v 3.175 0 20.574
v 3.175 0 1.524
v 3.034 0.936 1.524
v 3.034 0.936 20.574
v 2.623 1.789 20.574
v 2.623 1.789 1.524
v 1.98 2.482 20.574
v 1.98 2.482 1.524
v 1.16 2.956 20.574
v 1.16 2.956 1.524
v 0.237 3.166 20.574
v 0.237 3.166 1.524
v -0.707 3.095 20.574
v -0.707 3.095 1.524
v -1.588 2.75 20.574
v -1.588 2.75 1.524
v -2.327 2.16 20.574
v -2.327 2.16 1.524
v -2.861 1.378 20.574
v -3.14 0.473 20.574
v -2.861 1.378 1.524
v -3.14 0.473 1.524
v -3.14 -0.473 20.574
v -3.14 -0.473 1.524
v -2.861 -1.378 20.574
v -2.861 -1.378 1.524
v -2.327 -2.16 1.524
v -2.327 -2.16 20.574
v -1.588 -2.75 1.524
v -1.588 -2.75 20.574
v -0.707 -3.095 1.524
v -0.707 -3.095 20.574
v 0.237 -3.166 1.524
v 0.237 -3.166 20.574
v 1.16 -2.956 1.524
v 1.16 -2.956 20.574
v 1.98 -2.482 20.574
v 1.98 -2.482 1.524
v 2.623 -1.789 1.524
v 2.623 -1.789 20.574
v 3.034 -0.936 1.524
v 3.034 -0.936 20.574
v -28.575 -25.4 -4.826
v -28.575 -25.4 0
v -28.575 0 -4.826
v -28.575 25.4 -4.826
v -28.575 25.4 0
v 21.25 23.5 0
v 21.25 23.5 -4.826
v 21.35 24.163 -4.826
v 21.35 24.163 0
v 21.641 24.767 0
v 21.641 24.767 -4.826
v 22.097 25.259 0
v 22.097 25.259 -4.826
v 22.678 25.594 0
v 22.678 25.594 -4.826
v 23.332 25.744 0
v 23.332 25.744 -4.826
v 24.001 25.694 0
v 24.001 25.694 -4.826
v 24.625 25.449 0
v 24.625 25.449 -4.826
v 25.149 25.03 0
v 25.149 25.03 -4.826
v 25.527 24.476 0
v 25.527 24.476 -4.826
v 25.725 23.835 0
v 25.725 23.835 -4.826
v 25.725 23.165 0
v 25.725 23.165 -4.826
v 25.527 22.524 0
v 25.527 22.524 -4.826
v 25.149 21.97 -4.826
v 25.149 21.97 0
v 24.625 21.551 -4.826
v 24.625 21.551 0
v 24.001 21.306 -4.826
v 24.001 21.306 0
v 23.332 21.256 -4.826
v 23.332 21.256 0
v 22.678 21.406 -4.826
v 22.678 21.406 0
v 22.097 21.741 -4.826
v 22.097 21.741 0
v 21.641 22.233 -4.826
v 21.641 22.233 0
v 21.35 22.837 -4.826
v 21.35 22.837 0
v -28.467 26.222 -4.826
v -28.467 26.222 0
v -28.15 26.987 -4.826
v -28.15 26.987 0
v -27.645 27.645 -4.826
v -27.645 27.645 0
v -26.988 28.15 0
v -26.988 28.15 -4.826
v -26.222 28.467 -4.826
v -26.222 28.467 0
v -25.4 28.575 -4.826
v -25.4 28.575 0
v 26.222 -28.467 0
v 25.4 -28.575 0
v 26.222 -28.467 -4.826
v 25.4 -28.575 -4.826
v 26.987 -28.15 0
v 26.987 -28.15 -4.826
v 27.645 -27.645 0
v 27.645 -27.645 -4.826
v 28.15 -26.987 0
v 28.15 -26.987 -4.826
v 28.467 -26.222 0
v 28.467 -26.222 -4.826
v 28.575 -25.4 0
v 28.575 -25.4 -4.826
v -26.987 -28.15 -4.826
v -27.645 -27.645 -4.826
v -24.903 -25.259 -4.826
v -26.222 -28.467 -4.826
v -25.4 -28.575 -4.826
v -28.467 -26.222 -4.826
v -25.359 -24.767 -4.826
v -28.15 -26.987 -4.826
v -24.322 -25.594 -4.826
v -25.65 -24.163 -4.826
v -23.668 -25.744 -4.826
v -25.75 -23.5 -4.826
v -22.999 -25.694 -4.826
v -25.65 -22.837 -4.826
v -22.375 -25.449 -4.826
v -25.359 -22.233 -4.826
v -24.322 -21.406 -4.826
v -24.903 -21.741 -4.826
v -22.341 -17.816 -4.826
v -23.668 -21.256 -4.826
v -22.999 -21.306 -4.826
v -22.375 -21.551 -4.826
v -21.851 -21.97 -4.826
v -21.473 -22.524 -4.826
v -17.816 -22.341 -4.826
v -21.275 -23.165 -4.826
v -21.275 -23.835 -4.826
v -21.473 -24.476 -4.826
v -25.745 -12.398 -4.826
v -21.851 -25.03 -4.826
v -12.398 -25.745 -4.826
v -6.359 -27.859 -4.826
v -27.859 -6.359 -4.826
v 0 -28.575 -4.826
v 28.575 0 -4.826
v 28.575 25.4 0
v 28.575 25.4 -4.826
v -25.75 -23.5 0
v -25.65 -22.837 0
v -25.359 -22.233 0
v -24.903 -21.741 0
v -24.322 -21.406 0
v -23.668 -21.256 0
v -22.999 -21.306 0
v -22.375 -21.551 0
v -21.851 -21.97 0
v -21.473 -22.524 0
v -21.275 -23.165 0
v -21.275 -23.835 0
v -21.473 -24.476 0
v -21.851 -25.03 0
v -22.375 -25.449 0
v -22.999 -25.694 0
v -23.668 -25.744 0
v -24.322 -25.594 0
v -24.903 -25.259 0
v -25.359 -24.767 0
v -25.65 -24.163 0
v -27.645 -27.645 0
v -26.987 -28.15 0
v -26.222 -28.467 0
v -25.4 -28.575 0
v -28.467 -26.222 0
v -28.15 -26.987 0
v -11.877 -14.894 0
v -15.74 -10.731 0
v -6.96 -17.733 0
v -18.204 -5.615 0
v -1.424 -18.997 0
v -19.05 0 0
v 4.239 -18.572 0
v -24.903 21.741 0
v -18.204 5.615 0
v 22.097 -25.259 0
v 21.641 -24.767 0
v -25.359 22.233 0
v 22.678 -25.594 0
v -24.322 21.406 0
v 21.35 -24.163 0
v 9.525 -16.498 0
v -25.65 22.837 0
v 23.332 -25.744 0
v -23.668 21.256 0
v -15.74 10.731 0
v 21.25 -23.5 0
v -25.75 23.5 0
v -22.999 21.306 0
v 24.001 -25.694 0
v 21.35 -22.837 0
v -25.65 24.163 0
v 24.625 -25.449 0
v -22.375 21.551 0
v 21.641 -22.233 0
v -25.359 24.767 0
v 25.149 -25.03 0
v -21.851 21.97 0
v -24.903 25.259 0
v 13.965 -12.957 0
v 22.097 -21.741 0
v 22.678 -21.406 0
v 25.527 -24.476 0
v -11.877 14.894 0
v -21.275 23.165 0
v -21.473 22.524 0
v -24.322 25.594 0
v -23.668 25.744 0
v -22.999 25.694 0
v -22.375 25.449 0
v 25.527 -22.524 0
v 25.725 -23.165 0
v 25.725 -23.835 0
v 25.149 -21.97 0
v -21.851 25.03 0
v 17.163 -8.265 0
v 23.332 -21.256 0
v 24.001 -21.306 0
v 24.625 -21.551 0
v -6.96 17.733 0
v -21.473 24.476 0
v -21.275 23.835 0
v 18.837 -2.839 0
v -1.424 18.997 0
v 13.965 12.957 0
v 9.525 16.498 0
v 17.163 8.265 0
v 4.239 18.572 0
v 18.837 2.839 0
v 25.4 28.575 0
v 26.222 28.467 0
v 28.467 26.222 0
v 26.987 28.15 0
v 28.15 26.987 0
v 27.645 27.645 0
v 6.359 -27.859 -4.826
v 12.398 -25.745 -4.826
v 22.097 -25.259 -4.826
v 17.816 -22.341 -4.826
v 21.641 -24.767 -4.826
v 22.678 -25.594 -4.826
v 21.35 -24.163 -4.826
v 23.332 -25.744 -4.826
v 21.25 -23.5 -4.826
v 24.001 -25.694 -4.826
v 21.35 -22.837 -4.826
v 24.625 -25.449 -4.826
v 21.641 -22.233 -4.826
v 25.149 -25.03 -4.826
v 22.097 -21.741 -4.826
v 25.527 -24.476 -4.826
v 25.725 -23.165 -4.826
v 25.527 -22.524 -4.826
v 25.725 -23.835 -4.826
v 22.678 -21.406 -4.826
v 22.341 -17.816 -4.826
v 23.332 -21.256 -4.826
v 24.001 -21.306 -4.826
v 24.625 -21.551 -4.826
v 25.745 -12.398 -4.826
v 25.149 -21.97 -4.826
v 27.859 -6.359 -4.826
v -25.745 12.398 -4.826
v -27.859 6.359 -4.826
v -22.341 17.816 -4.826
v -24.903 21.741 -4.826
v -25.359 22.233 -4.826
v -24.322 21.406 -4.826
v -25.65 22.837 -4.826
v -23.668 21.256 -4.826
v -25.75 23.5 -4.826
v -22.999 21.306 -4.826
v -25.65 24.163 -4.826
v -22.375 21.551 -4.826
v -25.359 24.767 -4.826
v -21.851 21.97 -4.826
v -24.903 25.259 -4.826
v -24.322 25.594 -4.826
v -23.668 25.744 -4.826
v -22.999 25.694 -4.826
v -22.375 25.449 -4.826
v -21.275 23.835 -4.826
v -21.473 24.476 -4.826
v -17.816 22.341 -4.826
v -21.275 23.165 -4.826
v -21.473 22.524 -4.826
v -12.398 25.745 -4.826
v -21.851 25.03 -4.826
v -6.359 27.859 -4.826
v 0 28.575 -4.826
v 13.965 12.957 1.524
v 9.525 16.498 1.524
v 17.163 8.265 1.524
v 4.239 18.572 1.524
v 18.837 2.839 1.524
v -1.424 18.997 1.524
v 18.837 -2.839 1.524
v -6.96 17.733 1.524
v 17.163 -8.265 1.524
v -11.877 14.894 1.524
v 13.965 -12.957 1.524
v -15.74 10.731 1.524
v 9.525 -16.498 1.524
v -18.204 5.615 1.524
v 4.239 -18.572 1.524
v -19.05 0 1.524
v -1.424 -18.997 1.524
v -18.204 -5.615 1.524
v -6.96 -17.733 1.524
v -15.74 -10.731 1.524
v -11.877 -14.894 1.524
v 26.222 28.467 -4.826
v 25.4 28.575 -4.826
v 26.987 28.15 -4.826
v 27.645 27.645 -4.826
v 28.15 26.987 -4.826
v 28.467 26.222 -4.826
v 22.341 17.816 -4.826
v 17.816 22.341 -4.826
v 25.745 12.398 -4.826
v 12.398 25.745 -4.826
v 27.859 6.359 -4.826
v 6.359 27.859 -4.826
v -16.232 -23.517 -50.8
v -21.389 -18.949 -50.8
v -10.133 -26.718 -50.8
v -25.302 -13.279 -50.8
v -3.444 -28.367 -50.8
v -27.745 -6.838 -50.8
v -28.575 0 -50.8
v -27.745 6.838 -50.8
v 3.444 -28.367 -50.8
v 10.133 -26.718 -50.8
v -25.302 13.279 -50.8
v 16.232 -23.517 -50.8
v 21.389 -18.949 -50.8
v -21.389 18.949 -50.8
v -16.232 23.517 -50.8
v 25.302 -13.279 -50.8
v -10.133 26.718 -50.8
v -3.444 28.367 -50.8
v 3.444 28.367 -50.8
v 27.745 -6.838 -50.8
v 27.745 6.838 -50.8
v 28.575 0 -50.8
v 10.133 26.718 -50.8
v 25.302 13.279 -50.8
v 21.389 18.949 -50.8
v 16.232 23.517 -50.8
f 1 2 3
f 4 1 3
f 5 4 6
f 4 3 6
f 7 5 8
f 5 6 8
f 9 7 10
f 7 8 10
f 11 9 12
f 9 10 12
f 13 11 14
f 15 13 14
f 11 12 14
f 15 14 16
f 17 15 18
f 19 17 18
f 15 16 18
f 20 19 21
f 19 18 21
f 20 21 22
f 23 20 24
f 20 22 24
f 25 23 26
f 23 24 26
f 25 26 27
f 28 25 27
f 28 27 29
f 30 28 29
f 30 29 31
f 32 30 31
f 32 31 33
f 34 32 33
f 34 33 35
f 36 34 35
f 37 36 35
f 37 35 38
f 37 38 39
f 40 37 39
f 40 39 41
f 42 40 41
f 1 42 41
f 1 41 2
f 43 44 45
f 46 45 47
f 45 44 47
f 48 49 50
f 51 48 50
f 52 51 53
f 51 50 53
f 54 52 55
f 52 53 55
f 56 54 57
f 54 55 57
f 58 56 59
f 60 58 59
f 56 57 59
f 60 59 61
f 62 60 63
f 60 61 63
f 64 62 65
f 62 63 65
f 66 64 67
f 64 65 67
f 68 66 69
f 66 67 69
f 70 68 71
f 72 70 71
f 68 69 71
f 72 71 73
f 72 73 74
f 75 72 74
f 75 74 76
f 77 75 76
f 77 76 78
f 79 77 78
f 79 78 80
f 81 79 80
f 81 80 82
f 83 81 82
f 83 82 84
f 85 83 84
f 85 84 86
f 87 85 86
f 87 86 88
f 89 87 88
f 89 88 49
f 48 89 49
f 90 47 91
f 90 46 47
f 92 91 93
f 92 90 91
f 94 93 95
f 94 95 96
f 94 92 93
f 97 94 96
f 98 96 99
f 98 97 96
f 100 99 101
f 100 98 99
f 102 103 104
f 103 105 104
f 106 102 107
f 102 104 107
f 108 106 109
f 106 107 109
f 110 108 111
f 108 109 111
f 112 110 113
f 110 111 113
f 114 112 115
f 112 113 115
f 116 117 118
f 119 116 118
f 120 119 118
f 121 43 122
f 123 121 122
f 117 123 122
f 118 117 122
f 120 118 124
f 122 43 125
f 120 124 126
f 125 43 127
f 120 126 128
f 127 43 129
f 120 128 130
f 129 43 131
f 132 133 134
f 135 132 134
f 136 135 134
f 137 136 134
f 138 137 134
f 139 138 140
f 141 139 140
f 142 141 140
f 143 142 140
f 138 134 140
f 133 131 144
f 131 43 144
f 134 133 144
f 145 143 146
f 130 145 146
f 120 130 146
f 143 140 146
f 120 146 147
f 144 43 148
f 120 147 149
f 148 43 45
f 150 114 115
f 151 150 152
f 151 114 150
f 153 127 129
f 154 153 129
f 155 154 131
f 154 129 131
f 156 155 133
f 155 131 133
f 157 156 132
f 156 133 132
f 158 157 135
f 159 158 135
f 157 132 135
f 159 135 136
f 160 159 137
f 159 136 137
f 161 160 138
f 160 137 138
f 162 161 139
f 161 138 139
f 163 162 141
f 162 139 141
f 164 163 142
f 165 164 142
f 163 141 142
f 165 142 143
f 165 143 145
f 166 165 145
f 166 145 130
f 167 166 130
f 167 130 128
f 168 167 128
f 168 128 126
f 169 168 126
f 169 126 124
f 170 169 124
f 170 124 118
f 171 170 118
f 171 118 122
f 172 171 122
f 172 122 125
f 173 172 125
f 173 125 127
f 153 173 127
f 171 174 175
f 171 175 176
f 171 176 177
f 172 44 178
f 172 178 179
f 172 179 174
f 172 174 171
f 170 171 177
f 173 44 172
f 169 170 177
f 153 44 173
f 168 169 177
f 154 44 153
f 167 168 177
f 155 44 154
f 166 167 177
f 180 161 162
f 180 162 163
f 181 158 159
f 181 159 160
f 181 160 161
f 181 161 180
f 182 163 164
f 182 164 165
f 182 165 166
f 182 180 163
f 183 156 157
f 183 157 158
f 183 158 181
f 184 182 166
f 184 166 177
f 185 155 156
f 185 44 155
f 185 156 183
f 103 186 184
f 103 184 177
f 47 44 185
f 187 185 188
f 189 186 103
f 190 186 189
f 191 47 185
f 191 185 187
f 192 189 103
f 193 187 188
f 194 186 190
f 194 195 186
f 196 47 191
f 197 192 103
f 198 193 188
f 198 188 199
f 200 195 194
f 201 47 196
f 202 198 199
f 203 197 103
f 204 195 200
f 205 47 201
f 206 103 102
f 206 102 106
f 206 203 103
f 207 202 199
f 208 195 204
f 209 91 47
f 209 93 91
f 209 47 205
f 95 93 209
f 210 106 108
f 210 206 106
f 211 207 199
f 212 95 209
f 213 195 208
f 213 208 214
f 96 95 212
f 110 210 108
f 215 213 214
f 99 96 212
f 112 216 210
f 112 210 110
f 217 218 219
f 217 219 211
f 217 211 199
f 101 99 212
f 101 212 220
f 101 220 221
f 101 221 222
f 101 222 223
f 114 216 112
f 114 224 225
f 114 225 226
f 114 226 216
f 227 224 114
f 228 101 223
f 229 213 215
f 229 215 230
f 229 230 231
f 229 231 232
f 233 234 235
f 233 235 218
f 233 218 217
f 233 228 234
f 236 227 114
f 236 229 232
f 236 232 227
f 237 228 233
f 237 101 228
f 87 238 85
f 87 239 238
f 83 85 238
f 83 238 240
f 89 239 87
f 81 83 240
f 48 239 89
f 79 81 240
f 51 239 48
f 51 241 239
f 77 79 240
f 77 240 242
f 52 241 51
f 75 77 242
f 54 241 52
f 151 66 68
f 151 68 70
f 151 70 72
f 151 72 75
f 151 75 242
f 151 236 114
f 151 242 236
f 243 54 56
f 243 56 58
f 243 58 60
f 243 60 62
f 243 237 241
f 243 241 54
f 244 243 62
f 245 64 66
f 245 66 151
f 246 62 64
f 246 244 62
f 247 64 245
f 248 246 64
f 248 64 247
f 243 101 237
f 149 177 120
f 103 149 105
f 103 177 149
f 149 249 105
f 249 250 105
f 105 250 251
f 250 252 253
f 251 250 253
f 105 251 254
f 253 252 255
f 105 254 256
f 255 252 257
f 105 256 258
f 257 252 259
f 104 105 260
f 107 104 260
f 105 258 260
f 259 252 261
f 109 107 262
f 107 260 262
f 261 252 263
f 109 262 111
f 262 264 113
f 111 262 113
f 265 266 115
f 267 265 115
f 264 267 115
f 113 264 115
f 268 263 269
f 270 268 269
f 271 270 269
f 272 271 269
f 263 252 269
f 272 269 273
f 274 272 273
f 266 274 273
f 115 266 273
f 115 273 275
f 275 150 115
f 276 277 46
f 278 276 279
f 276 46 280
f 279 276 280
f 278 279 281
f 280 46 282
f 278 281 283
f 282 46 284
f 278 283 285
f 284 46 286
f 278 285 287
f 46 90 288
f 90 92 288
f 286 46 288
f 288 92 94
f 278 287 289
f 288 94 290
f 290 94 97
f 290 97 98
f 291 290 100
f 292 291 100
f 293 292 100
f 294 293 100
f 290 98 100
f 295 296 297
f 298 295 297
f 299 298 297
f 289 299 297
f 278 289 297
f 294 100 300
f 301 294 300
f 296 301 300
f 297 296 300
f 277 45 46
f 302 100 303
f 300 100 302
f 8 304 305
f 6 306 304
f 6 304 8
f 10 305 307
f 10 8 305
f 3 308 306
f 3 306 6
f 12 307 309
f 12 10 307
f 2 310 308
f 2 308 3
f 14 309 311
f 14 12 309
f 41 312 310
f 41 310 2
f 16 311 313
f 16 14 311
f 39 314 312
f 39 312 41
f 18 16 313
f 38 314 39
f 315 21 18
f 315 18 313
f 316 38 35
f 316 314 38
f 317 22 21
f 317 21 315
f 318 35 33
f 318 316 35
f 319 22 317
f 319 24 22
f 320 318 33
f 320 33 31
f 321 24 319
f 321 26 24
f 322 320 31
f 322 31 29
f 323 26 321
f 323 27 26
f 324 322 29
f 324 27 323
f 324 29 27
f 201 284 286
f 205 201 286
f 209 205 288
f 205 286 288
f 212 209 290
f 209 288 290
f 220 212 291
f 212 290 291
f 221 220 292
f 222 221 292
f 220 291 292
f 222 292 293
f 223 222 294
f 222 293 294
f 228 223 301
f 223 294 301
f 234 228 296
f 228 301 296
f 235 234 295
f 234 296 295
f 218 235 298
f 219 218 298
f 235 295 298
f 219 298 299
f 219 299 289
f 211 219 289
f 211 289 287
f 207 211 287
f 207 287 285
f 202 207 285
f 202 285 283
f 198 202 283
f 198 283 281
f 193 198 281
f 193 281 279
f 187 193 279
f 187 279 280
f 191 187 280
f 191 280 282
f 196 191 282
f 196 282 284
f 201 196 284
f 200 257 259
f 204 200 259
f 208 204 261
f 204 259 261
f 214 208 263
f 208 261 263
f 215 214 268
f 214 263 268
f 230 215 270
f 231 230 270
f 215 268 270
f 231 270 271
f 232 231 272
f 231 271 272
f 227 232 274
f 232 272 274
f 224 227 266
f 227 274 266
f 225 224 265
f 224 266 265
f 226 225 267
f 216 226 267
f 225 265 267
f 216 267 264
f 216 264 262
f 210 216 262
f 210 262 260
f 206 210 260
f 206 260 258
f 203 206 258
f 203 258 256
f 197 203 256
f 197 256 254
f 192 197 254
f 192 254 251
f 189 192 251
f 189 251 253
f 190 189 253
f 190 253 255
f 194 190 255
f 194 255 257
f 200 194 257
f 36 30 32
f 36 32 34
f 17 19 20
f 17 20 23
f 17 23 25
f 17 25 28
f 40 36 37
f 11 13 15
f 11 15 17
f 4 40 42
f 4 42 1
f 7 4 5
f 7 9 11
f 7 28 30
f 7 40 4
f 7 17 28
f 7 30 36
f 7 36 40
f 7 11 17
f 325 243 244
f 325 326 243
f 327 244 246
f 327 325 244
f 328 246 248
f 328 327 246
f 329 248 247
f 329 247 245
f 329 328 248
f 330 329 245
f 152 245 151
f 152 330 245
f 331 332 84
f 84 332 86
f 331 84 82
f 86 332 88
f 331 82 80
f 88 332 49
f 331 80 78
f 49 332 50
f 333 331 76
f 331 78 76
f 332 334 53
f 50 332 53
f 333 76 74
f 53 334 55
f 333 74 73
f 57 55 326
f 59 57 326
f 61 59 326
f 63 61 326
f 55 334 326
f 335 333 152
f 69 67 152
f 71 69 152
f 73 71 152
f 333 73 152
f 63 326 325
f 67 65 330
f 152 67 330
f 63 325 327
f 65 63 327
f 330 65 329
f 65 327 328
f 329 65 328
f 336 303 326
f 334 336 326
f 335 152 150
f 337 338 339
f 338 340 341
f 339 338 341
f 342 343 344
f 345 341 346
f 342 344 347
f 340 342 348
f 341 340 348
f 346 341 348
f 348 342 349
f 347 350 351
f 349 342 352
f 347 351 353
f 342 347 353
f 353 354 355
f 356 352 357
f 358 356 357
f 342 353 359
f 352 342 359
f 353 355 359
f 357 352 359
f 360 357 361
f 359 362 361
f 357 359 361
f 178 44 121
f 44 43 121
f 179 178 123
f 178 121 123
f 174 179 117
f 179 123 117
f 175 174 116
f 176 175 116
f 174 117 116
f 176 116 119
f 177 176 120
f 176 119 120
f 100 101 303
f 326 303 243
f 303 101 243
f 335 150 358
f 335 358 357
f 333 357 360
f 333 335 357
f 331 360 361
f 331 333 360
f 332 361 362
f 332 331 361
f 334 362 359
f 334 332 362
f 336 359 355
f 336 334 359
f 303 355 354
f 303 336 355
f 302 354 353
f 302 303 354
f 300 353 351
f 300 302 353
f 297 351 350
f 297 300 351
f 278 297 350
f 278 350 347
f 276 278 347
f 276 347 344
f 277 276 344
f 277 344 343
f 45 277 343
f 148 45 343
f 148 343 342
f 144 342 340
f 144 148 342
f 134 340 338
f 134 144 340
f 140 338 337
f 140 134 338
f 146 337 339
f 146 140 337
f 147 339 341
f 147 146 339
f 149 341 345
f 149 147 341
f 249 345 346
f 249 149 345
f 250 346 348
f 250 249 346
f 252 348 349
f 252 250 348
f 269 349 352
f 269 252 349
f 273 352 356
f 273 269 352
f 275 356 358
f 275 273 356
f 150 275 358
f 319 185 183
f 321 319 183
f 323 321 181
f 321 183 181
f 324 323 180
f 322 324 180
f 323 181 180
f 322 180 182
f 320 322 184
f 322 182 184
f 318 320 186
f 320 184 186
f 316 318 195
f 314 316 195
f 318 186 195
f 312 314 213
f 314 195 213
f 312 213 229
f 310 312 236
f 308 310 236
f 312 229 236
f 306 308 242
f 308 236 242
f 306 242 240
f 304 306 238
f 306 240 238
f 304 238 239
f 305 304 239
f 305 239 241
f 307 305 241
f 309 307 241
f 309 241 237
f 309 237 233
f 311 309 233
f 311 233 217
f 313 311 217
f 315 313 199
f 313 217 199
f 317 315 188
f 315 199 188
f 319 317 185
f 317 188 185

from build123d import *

# Parameters (mm, degrees)
SKETCH1_W            = 57.15
SKETCH1_H            = 57.15
BOSS_EXTRUDE1_DEPTH  = 4.826
SKETCH2_R            = 19.05
BOSS_EXTRUDE2_DEPTH  = 1.524
SKETCH3_R            = 3.175
BOSS_EXTRUDE3_DEPTH  = 20.574
SKETCH5_R            = 28.575
BOSS_EXTRUDE4_DEPTH  = 50.8
M4_CLEARANCE_HOLE1_D = 4.5
FILLET1_R            = 3.175


with BuildPart() as part:
    # Sketch1 → Boss-Extrude1 (new body)
    with BuildSketch(Plane.XY):
        Rectangle(SKETCH1_W, SKETCH1_H)
    extrude(amount=-BOSS_EXTRUDE1_DEPTH)

    # Sketch2 → Boss-Extrude2 (add)
    with BuildSketch(Plane.XY):
        with Locations(Location((0, 0, 0), (0, 0, 180))):
            Circle(SKETCH2_R)
    extrude(amount=BOSS_EXTRUDE2_DEPTH)

    # Sketch3 → Boss-Extrude3 (add)
    with BuildSketch(Plane.XY):
        Circle(SKETCH3_R)
    extrude(amount=BOSS_EXTRUDE3_DEPTH)

    # Sketch5 → Boss-Extrude4 (add)
    with BuildSketch(Plane.XY):
        Circle(SKETCH5_R)
    extrude(amount=-BOSS_EXTRUDE4_DEPTH)

    # M4 Clearance Hole1 (through all)
    with Locations(Plane.XY):
        with Locations((-23.5, 23.5), (23.5, 23.5), (23.5, -23.5), (-23.5, -23.5)):
            Hole(M4_CLEARANCE_HOLE1_D / 2)

    # Fillet1
    fillet1_edges = [part.edges().sort_by_distance(p)[0] for p in [
        (28.575, -28.575, -2.413),
        (-28.575, -28.575, -2.413),
        (-28.575, 28.575, -2.413),
        (28.575, 28.575, -2.413),
    ]]
    fillet(fillet1_edges, radius=FILLET1_R)


solid = part.part
